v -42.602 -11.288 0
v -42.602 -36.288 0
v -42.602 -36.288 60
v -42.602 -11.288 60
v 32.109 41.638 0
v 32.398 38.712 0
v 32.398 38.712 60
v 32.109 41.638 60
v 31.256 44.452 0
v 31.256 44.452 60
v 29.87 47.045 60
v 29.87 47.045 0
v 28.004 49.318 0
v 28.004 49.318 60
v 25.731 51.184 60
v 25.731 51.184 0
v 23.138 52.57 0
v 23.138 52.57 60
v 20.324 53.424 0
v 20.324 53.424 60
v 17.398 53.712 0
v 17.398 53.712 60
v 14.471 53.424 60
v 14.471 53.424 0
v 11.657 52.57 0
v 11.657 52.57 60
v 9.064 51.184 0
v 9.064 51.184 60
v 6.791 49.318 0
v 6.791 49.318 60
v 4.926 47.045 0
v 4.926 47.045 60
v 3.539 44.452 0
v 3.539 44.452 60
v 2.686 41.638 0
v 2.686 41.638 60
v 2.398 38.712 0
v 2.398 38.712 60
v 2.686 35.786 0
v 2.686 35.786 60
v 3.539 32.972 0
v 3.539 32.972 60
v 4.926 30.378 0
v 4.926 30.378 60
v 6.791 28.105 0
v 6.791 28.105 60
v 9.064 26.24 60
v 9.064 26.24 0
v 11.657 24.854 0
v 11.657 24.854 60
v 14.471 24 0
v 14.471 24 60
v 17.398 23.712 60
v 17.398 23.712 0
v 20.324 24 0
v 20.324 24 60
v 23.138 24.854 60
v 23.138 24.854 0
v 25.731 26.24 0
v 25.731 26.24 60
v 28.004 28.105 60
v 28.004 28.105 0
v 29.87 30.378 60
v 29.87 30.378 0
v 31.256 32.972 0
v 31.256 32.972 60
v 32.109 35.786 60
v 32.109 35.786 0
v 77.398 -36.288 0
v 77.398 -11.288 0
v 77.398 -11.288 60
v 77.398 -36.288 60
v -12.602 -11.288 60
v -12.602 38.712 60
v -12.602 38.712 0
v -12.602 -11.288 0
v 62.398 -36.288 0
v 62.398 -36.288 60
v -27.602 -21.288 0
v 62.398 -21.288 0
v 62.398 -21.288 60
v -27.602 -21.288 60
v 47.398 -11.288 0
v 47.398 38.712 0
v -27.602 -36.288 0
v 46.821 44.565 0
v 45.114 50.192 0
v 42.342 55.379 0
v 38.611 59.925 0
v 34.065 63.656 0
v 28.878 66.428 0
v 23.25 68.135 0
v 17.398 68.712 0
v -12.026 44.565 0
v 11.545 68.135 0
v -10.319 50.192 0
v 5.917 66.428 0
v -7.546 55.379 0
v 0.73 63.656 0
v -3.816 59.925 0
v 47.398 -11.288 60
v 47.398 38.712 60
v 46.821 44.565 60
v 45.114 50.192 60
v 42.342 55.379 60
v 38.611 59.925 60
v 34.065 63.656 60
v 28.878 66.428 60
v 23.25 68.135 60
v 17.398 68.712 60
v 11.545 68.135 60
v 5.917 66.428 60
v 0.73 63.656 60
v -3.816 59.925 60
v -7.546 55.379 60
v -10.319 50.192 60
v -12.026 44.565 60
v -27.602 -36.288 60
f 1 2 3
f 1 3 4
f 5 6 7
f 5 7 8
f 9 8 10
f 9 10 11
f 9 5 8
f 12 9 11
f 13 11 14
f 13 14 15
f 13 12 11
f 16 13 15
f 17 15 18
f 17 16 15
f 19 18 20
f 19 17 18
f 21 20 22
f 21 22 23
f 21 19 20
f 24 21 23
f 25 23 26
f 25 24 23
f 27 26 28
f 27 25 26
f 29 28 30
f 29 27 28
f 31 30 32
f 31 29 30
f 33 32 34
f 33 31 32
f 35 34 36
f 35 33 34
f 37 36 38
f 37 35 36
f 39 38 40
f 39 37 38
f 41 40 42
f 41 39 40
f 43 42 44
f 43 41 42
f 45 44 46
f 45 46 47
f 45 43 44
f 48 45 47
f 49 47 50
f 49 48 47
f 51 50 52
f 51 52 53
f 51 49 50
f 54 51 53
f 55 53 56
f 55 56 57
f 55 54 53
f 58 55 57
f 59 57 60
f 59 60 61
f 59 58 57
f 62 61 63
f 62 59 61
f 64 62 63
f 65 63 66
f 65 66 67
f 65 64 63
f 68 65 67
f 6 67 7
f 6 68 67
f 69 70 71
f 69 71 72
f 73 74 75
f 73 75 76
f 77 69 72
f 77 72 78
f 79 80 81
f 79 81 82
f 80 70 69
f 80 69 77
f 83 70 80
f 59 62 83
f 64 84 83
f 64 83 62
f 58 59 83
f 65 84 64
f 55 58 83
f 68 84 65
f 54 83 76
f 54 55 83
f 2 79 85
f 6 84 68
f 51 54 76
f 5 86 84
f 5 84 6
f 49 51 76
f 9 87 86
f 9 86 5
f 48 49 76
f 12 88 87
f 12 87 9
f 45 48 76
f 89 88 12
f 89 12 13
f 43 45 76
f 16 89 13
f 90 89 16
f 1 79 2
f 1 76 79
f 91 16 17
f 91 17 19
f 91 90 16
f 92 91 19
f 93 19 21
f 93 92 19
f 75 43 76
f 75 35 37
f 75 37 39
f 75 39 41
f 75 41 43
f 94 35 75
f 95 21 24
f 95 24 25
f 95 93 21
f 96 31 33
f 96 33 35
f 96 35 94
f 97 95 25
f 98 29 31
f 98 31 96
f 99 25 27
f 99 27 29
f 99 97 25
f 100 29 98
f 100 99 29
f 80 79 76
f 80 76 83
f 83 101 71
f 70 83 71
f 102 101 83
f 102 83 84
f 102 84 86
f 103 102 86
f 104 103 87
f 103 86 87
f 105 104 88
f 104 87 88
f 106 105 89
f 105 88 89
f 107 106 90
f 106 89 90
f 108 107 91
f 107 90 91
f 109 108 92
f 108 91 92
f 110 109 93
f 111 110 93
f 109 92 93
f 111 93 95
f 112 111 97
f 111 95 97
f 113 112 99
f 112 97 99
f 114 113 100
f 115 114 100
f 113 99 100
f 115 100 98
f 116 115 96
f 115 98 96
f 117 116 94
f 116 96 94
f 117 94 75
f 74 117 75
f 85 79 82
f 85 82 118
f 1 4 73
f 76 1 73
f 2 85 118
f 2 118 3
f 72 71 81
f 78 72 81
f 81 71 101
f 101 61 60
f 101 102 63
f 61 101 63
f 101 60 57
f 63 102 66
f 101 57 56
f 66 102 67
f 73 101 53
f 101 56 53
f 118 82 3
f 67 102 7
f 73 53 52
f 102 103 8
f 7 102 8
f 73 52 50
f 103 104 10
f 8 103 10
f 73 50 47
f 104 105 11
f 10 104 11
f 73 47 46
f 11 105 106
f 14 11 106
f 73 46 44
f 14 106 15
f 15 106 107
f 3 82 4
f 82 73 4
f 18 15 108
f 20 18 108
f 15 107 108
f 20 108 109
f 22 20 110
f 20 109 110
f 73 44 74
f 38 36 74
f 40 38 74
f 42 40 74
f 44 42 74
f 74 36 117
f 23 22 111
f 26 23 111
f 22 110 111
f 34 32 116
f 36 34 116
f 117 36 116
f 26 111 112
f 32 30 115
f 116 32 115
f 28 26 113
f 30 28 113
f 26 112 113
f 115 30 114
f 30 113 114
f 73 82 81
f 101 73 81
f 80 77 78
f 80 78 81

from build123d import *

# Parameters (mm, degrees)
SKETCH1_R           = 15
BOSS_EXTRUDE2_DEPTH = 60


with BuildPart() as part:
    # Sketch1 → Boss-Extrude2 (new body)
    # profile 1 of 2: a face of its own
    with BuildSketch(Plane.XY):
        with BuildLine():
            Line((-12.60240546, 38.711870299), (-12.60240546, -11.288129701))
            Line((-12.60240546, -11.288129701), (47.39759454, -11.288129701))
            Line((47.39759454, -11.288129701), (47.39759454, 38.711870299))
            ThreePointArc((47.39759454, 38.711870299), (17.39759454, 68.711870299), (-12.60240546, 38.711870299))
        make_face()
        with Locations((17.39759454, 38.711870299)):
            Circle(SKETCH1_R, mode=Mode.SUBTRACT)
    # profile 2 of 2: a face of its own
    with BuildSketch(Plane.XY):
        Polygon((-42.60240546, -11.288129701), (77.39759454, -11.288129701), (77.39759454, -36.288129701), (62.39759454, -36.288129701), (62.39759454, -21.288129701), (-27.60240546, -21.288129701), (-27.60240546, -36.288129701), (-42.60240546, -36.288129701), align=None)
    extrude(amount=BOSS_EXTRUDE2_DEPTH)


solid = part.part
